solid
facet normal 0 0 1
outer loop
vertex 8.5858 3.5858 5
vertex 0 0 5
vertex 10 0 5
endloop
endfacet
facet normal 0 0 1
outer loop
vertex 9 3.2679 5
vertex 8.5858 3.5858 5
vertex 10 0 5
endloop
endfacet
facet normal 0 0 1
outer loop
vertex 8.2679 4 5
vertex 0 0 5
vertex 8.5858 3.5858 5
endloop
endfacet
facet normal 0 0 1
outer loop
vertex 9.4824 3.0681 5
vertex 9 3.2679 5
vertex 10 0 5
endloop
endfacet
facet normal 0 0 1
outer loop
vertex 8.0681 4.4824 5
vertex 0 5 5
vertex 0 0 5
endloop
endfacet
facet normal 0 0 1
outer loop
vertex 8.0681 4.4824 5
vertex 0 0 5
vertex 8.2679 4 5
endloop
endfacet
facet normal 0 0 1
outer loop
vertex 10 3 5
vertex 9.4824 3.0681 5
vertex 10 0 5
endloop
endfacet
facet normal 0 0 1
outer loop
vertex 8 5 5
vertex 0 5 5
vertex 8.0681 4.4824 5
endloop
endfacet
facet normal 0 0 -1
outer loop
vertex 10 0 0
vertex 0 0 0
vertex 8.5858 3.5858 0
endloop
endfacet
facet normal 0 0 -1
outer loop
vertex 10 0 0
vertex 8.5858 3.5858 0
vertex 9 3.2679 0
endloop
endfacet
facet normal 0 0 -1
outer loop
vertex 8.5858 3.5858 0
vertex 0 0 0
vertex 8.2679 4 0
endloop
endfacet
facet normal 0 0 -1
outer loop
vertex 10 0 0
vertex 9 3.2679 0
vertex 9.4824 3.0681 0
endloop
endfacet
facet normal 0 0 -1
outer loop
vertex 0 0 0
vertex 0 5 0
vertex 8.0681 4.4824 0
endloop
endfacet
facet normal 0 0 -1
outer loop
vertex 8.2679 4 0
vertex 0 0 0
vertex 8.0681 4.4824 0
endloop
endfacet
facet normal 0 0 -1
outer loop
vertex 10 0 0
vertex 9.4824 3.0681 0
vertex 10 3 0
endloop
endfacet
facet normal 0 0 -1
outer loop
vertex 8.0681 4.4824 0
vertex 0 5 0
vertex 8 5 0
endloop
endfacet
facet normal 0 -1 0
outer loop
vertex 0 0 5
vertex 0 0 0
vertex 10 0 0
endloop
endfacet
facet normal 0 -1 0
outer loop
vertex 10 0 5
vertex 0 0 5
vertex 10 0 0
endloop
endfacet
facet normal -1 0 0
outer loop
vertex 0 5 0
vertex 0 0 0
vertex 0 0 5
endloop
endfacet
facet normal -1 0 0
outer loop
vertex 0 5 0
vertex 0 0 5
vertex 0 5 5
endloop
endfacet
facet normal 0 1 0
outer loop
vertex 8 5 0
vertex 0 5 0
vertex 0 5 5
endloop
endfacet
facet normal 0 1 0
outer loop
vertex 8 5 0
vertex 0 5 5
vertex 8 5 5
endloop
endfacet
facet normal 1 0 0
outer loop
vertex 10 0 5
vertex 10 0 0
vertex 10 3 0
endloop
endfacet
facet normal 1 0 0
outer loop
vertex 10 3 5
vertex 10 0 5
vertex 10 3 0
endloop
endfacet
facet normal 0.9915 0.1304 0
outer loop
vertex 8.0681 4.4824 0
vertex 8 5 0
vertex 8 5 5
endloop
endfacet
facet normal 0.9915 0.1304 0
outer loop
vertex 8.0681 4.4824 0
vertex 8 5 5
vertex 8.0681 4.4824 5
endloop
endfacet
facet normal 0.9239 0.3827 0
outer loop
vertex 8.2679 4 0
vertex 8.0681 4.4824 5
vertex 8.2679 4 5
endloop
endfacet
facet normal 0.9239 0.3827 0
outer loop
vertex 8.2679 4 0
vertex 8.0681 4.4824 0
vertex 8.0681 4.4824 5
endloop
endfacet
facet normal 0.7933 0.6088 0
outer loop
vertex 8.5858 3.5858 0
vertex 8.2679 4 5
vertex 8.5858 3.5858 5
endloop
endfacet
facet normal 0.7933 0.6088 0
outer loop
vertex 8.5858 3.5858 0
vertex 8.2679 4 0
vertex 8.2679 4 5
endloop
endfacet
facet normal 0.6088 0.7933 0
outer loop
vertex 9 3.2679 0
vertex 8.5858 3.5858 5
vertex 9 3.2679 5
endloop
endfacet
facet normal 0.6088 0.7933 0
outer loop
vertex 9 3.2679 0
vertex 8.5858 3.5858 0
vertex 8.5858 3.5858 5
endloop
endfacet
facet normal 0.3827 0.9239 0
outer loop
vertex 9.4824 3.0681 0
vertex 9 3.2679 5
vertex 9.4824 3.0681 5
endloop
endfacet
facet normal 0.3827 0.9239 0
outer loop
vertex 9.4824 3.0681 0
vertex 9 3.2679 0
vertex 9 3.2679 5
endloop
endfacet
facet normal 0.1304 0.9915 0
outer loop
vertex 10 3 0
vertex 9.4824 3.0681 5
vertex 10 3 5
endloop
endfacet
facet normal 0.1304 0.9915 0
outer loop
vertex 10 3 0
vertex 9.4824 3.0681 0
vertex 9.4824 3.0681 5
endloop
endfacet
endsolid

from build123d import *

# Parameters (mm, degrees)
CYLINDER_R     = 2
CYLINDER_DEPTH = 5
BOX_W          = 10
BOX_H          = 5
BOX_DEPTH      = 5


with BuildPart() as cylinder:
    # Cylinder → Cylinder (new body)
    with BuildSketch(Plane(origin=(10, 5, 0), x_dir=(1, 0, 0), z_dir=(0, 0, 1))):
        Circle(CYLINDER_R)
    extrude(amount=CYLINDER_DEPTH)


with BuildPart() as cut:
    # Box → Box (new body)
    with BuildSketch(Plane.XY):
        with Locations((5, 2.5)):
            Rectangle(BOX_W, BOX_H)
    extrude(amount=BOX_DEPTH)

    # Cut: cut Cylinder
    add(cylinder.part, mode=Mode.SUBTRACT)


solid = cut.part
